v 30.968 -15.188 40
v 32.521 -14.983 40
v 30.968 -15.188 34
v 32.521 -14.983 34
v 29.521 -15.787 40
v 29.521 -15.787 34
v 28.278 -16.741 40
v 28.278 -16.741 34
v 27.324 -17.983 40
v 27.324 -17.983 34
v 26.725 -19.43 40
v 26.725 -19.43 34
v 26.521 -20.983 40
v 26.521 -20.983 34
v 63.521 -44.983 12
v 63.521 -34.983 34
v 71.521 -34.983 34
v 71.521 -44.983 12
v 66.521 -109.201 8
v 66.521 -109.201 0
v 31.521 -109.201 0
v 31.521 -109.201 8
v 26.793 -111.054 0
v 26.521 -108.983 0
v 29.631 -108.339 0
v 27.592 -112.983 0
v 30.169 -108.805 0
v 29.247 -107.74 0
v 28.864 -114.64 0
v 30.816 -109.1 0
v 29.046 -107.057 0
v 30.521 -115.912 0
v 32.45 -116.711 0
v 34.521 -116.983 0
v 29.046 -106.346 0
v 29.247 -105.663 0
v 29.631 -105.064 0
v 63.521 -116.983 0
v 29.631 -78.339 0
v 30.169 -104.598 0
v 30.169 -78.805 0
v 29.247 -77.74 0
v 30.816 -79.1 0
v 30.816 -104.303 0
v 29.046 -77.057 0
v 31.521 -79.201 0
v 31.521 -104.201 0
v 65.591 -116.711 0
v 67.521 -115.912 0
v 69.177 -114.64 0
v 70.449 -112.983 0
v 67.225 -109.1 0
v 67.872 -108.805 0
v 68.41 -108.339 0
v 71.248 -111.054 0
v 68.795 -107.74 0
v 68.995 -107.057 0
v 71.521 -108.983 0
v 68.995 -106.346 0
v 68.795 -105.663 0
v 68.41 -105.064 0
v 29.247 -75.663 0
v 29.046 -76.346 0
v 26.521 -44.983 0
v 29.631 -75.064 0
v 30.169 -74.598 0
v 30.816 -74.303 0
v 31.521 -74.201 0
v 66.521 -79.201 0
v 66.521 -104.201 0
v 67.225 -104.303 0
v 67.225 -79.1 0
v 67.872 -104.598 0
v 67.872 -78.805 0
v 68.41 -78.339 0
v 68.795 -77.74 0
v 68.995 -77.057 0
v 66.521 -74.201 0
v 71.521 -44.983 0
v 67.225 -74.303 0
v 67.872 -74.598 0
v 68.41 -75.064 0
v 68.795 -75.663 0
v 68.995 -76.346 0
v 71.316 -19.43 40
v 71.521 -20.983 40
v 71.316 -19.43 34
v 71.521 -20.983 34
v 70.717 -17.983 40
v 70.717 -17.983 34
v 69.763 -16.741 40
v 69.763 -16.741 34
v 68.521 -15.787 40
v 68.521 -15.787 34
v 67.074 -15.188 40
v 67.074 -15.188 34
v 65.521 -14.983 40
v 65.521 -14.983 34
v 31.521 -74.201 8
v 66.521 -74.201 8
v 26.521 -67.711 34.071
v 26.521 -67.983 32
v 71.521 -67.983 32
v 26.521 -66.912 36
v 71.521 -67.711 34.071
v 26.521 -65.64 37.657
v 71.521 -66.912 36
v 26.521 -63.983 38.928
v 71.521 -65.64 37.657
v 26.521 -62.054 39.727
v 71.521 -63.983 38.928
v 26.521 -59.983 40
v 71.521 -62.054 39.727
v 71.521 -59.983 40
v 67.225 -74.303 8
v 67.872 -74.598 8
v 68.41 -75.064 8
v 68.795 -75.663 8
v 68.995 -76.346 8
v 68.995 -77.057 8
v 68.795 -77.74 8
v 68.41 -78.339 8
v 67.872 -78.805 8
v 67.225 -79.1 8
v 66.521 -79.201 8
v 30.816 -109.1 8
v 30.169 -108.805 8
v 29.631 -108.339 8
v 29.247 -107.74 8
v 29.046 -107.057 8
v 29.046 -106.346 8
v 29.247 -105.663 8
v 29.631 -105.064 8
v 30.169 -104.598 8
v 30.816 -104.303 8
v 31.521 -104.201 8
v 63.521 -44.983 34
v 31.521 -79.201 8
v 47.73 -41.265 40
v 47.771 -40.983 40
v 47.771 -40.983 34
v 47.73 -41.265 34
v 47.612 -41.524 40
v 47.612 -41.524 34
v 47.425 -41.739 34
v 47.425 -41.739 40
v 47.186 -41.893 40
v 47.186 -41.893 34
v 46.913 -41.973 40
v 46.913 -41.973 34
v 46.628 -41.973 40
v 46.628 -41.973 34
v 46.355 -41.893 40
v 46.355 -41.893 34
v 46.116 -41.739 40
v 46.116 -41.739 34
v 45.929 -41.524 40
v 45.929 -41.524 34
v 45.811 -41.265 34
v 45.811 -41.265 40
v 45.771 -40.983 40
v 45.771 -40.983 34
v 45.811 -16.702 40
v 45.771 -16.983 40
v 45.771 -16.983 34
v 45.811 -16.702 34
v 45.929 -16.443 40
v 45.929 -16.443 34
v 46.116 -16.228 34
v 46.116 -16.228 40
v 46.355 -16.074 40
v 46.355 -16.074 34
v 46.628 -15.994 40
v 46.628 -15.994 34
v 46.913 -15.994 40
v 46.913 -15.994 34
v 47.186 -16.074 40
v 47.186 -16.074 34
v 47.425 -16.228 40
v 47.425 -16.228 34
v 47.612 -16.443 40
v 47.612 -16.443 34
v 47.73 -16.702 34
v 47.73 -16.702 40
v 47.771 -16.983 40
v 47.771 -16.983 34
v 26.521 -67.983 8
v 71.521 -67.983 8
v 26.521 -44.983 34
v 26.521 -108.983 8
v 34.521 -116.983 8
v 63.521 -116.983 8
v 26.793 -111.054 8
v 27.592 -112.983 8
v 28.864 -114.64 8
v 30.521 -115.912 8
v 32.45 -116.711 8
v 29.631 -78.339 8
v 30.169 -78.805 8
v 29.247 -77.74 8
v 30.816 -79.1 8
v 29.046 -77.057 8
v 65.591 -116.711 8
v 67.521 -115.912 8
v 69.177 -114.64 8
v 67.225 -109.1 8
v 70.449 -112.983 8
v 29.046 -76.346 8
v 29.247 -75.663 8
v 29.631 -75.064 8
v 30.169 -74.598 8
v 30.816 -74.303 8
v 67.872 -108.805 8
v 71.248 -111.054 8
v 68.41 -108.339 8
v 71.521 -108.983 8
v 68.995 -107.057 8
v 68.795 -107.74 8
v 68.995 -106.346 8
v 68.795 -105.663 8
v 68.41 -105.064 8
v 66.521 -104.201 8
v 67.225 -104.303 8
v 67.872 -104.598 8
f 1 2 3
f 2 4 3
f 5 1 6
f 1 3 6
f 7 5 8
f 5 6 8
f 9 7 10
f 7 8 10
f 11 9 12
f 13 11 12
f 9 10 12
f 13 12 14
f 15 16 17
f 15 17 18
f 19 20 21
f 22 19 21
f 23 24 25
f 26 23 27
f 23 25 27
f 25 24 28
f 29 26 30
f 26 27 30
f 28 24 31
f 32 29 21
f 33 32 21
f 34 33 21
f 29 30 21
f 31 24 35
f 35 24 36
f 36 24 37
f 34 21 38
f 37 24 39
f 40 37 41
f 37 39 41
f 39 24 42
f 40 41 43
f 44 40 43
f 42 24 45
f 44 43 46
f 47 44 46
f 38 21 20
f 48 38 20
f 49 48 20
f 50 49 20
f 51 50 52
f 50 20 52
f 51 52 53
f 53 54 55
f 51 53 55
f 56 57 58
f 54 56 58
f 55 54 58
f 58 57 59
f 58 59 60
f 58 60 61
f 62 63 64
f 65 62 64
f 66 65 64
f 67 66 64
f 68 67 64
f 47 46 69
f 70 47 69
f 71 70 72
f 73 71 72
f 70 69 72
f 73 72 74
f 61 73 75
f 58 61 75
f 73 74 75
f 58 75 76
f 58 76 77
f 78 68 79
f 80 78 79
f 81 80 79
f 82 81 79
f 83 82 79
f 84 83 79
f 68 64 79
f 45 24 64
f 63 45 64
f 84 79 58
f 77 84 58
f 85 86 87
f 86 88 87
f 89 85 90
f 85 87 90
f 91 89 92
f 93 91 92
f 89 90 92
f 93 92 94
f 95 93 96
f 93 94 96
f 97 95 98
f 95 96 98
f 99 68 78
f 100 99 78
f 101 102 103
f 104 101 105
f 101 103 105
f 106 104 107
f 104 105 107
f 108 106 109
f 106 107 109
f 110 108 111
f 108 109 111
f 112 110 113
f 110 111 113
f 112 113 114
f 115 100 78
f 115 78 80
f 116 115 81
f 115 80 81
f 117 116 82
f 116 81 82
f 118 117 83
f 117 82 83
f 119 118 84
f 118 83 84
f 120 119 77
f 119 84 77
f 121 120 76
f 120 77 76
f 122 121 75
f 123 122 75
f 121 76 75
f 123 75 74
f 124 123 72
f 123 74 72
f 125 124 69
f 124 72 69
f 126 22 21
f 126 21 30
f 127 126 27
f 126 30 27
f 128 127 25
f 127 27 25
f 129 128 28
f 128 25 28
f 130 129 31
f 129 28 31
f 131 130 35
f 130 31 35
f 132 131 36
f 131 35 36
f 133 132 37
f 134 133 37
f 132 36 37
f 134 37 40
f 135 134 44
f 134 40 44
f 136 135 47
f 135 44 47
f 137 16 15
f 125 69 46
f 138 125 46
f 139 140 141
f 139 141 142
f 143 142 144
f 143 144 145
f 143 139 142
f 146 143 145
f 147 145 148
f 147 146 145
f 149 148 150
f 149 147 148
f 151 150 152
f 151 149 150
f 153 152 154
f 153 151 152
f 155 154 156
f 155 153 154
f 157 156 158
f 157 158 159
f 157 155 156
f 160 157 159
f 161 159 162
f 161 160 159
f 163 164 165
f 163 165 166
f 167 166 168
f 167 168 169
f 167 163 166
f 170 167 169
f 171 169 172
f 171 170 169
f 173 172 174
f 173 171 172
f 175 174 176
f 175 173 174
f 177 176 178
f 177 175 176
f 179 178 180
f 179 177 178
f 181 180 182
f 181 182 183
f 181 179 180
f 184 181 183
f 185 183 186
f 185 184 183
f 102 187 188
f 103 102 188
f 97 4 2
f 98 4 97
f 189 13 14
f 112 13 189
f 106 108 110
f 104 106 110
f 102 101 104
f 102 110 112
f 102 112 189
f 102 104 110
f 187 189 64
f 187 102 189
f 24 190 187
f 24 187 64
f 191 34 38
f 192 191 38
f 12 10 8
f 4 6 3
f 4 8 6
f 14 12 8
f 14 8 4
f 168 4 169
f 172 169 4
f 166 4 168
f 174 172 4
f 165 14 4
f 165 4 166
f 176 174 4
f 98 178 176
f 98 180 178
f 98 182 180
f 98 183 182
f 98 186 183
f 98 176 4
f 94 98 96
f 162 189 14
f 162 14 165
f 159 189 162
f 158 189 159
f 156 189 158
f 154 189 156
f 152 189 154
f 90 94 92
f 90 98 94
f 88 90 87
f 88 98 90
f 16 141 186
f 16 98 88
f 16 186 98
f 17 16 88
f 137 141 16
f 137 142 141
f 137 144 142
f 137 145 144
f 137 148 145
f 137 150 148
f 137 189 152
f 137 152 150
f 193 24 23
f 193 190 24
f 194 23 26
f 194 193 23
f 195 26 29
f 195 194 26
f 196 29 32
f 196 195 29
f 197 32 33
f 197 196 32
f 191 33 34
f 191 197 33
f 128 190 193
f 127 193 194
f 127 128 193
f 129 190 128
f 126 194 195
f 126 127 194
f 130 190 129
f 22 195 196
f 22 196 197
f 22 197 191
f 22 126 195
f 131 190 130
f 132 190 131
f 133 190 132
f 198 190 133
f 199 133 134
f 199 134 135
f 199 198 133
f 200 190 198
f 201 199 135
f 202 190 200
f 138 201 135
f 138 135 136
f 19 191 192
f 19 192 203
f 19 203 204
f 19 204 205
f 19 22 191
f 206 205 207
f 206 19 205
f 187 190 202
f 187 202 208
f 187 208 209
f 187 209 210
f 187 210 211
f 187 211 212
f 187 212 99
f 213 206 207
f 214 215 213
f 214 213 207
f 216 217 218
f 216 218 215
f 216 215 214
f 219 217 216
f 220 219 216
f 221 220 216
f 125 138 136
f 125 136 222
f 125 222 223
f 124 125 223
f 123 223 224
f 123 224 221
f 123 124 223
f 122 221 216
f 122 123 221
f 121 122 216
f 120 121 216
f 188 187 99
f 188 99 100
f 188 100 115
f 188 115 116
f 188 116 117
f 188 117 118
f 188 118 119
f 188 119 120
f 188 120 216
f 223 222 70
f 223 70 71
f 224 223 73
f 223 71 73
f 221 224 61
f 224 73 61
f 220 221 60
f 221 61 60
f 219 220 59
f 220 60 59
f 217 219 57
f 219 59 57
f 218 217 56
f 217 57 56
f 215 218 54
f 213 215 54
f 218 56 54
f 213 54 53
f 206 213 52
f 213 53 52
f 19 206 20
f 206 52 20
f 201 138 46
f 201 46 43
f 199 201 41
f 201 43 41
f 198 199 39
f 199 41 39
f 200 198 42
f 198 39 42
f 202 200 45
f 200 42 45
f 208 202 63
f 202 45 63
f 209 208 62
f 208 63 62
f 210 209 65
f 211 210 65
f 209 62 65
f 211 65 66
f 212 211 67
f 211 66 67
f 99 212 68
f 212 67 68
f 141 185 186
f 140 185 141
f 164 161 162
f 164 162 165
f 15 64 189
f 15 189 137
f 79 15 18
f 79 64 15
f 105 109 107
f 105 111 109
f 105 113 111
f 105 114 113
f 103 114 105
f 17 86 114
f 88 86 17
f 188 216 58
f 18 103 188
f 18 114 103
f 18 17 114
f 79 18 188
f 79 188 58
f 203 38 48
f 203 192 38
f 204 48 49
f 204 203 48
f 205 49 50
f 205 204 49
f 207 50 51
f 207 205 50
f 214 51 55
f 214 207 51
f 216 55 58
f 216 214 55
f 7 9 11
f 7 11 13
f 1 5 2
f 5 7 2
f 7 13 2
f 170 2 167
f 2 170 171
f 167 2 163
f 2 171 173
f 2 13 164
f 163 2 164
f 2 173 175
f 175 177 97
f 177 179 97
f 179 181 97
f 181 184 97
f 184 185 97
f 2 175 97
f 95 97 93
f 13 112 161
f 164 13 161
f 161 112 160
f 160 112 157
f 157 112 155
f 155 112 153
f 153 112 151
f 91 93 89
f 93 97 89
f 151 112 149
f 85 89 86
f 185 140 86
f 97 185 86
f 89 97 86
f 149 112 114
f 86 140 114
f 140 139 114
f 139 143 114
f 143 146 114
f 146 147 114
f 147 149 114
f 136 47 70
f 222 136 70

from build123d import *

# Parameters (mm, degrees)
SKETCH_1_W          = 45
SKETCH_1_H          = 72
EXTRUDE_1_DEPTH     = 8
SKETCH_3_W          = 45
SKETCH_3_H          = 23
EXTRUDE_2_DEPTH     = 32
SKETCH_4_W          = 45
SKETCH_4_H          = 6
EXTRUDE_3_DEPTH     = 30
CUT_EXTRUDE_1_DEPTH = 6
FILLET_1_R          = 8
RIB_1_REACH         = 133.568
SKETCH_7_WALL_W     = 289.301938088
SKETCH_7_WALL_H     = 8
FILLET_2_R          = 8
FILLET_3_R          = 6


with BuildPart() as part:
    # 草图1 → 凸台-拉伸1 (new body)
    with BuildSketch(Plane.XY):
        with Locations((49.020589592, -80.983410709)):
            Rectangle(SKETCH_1_W, SKETCH_1_H)
        with BuildLine():
            Line((31.520589592, -74.201396253), (66.520589592, -74.201396253))
            ThreePointArc((66.520589592, -74.201396253), (69.020589592, -76.701396253), (66.520589592, -79.201396253))
            Line((66.520589592, -79.201396253), (31.520589592, -79.201396253))
            ThreePointArc((31.520589592, -79.201396253), (29.020589592, -76.701396253), (31.520589592, -74.201396253))
        make_face(mode=Mode.SUBTRACT)
        with BuildLine():
            Line((31.520589592, -104.201396253), (66.520589592, -104.201396253))
            ThreePointArc((66.520589592, -104.201396253), (69.020589592, -106.701396253), (66.520589592, -109.201396253))
            Line((66.520589592, -109.201396253), (31.520589592, -109.201396253))
            ThreePointArc((31.520589592, -109.201396253), (29.020589592, -106.701396253), (31.520589592, -104.201396253))
        make_face(mode=Mode.SUBTRACT)
    extrude(amount=EXTRUDE_1_DEPTH)

    # 草图3 → 凸台-拉伸2 (add)
    with BuildSketch(Plane.XY.offset(8)):
        with Locations((49.020589592, -56.483410709)):
            Rectangle(SKETCH_3_W, SKETCH_3_H)
    extrude(amount=EXTRUDE_2_DEPTH)

    # 草图4 → 凸台-拉伸3 (add)
    with BuildSketch(Plane(origin=(0, -44.983410709, 0), x_dir=(1, 0, 0), z_dir=(0, 1, 0))):
        with Locations((49.020589592, -37)):
            Rectangle(SKETCH_4_W, SKETCH_4_H)
    extrude(amount=EXTRUDE_3_DEPTH)

    # 草图5 → 切除-拉伸1 (cut)
    with BuildSketch(Plane.XY.offset(40)):
        with BuildLine():
            Line((47.770589592, -16.983410709), (47.770589592, -40.983410709))
            ThreePointArc((47.770589592, -40.983410709), (46.770589592, -41.983410709), (45.770589592, -40.983410709))
            Line((45.770589592, -40.983410709), (45.770589592, -16.983410709))
            ThreePointArc((45.770589592, -16.983410709), (46.770589592, -15.983410709), (47.770589592, -16.983410709))
        make_face()
    extrude(amount=-CUT_EXTRUDE_1_DEPTH, mode=Mode.SUBTRACT)

    # 圆角1
    fillet_1_edges = [part.edges().sort_by_distance(p)[0] for p in [
        (71.520589592, -116.983410709, 4),
        (26.520589592, -116.983410709, 4),
    ]]
    fillet(fillet_1_edges, radius=FILLET_1_R)

    # 草图7 wall → 筋1 (add, up to next)
    with BuildSketch(Plane(origin=(71.520589592, -39.983410709, 23), x_dir=(0, -0.413802944301, -0.910366477463), z_dir=(0, 0.910366477463, -0.413802944301)), mode=Mode.PRIVATE) as rib_1_sk1:
        with Locations((0, 4)):
            Rectangle(SKETCH_7_WALL_W, SKETCH_7_WALL_H)
    rib_1_tool1 = extrude(rib_1_sk1.sketch, amount=-RIB_1_REACH, mode=Mode.PRIVATE) - part.part
    add(rib_1_tool1.solids().sort_by_distance((71.520589592, -39.983410709, 23))[0])

    # 圆角2
    fillet_2_edges = [part.edges().sort_by_distance(p)[0] for p in [
        (49.020589592, -67.983410709, 40),
    ]]
    fillet(fillet_2_edges, radius=FILLET_2_R)

    # 圆角3
    fillet_3_edges = [part.edges().sort_by_distance(p)[0] for p in [
        (26.520589592, -14.983410709, 37),
        (71.520589592, -14.983410709, 37),
    ]]
    fillet(fillet_3_edges, radius=FILLET_3_R)


solid = part.part
